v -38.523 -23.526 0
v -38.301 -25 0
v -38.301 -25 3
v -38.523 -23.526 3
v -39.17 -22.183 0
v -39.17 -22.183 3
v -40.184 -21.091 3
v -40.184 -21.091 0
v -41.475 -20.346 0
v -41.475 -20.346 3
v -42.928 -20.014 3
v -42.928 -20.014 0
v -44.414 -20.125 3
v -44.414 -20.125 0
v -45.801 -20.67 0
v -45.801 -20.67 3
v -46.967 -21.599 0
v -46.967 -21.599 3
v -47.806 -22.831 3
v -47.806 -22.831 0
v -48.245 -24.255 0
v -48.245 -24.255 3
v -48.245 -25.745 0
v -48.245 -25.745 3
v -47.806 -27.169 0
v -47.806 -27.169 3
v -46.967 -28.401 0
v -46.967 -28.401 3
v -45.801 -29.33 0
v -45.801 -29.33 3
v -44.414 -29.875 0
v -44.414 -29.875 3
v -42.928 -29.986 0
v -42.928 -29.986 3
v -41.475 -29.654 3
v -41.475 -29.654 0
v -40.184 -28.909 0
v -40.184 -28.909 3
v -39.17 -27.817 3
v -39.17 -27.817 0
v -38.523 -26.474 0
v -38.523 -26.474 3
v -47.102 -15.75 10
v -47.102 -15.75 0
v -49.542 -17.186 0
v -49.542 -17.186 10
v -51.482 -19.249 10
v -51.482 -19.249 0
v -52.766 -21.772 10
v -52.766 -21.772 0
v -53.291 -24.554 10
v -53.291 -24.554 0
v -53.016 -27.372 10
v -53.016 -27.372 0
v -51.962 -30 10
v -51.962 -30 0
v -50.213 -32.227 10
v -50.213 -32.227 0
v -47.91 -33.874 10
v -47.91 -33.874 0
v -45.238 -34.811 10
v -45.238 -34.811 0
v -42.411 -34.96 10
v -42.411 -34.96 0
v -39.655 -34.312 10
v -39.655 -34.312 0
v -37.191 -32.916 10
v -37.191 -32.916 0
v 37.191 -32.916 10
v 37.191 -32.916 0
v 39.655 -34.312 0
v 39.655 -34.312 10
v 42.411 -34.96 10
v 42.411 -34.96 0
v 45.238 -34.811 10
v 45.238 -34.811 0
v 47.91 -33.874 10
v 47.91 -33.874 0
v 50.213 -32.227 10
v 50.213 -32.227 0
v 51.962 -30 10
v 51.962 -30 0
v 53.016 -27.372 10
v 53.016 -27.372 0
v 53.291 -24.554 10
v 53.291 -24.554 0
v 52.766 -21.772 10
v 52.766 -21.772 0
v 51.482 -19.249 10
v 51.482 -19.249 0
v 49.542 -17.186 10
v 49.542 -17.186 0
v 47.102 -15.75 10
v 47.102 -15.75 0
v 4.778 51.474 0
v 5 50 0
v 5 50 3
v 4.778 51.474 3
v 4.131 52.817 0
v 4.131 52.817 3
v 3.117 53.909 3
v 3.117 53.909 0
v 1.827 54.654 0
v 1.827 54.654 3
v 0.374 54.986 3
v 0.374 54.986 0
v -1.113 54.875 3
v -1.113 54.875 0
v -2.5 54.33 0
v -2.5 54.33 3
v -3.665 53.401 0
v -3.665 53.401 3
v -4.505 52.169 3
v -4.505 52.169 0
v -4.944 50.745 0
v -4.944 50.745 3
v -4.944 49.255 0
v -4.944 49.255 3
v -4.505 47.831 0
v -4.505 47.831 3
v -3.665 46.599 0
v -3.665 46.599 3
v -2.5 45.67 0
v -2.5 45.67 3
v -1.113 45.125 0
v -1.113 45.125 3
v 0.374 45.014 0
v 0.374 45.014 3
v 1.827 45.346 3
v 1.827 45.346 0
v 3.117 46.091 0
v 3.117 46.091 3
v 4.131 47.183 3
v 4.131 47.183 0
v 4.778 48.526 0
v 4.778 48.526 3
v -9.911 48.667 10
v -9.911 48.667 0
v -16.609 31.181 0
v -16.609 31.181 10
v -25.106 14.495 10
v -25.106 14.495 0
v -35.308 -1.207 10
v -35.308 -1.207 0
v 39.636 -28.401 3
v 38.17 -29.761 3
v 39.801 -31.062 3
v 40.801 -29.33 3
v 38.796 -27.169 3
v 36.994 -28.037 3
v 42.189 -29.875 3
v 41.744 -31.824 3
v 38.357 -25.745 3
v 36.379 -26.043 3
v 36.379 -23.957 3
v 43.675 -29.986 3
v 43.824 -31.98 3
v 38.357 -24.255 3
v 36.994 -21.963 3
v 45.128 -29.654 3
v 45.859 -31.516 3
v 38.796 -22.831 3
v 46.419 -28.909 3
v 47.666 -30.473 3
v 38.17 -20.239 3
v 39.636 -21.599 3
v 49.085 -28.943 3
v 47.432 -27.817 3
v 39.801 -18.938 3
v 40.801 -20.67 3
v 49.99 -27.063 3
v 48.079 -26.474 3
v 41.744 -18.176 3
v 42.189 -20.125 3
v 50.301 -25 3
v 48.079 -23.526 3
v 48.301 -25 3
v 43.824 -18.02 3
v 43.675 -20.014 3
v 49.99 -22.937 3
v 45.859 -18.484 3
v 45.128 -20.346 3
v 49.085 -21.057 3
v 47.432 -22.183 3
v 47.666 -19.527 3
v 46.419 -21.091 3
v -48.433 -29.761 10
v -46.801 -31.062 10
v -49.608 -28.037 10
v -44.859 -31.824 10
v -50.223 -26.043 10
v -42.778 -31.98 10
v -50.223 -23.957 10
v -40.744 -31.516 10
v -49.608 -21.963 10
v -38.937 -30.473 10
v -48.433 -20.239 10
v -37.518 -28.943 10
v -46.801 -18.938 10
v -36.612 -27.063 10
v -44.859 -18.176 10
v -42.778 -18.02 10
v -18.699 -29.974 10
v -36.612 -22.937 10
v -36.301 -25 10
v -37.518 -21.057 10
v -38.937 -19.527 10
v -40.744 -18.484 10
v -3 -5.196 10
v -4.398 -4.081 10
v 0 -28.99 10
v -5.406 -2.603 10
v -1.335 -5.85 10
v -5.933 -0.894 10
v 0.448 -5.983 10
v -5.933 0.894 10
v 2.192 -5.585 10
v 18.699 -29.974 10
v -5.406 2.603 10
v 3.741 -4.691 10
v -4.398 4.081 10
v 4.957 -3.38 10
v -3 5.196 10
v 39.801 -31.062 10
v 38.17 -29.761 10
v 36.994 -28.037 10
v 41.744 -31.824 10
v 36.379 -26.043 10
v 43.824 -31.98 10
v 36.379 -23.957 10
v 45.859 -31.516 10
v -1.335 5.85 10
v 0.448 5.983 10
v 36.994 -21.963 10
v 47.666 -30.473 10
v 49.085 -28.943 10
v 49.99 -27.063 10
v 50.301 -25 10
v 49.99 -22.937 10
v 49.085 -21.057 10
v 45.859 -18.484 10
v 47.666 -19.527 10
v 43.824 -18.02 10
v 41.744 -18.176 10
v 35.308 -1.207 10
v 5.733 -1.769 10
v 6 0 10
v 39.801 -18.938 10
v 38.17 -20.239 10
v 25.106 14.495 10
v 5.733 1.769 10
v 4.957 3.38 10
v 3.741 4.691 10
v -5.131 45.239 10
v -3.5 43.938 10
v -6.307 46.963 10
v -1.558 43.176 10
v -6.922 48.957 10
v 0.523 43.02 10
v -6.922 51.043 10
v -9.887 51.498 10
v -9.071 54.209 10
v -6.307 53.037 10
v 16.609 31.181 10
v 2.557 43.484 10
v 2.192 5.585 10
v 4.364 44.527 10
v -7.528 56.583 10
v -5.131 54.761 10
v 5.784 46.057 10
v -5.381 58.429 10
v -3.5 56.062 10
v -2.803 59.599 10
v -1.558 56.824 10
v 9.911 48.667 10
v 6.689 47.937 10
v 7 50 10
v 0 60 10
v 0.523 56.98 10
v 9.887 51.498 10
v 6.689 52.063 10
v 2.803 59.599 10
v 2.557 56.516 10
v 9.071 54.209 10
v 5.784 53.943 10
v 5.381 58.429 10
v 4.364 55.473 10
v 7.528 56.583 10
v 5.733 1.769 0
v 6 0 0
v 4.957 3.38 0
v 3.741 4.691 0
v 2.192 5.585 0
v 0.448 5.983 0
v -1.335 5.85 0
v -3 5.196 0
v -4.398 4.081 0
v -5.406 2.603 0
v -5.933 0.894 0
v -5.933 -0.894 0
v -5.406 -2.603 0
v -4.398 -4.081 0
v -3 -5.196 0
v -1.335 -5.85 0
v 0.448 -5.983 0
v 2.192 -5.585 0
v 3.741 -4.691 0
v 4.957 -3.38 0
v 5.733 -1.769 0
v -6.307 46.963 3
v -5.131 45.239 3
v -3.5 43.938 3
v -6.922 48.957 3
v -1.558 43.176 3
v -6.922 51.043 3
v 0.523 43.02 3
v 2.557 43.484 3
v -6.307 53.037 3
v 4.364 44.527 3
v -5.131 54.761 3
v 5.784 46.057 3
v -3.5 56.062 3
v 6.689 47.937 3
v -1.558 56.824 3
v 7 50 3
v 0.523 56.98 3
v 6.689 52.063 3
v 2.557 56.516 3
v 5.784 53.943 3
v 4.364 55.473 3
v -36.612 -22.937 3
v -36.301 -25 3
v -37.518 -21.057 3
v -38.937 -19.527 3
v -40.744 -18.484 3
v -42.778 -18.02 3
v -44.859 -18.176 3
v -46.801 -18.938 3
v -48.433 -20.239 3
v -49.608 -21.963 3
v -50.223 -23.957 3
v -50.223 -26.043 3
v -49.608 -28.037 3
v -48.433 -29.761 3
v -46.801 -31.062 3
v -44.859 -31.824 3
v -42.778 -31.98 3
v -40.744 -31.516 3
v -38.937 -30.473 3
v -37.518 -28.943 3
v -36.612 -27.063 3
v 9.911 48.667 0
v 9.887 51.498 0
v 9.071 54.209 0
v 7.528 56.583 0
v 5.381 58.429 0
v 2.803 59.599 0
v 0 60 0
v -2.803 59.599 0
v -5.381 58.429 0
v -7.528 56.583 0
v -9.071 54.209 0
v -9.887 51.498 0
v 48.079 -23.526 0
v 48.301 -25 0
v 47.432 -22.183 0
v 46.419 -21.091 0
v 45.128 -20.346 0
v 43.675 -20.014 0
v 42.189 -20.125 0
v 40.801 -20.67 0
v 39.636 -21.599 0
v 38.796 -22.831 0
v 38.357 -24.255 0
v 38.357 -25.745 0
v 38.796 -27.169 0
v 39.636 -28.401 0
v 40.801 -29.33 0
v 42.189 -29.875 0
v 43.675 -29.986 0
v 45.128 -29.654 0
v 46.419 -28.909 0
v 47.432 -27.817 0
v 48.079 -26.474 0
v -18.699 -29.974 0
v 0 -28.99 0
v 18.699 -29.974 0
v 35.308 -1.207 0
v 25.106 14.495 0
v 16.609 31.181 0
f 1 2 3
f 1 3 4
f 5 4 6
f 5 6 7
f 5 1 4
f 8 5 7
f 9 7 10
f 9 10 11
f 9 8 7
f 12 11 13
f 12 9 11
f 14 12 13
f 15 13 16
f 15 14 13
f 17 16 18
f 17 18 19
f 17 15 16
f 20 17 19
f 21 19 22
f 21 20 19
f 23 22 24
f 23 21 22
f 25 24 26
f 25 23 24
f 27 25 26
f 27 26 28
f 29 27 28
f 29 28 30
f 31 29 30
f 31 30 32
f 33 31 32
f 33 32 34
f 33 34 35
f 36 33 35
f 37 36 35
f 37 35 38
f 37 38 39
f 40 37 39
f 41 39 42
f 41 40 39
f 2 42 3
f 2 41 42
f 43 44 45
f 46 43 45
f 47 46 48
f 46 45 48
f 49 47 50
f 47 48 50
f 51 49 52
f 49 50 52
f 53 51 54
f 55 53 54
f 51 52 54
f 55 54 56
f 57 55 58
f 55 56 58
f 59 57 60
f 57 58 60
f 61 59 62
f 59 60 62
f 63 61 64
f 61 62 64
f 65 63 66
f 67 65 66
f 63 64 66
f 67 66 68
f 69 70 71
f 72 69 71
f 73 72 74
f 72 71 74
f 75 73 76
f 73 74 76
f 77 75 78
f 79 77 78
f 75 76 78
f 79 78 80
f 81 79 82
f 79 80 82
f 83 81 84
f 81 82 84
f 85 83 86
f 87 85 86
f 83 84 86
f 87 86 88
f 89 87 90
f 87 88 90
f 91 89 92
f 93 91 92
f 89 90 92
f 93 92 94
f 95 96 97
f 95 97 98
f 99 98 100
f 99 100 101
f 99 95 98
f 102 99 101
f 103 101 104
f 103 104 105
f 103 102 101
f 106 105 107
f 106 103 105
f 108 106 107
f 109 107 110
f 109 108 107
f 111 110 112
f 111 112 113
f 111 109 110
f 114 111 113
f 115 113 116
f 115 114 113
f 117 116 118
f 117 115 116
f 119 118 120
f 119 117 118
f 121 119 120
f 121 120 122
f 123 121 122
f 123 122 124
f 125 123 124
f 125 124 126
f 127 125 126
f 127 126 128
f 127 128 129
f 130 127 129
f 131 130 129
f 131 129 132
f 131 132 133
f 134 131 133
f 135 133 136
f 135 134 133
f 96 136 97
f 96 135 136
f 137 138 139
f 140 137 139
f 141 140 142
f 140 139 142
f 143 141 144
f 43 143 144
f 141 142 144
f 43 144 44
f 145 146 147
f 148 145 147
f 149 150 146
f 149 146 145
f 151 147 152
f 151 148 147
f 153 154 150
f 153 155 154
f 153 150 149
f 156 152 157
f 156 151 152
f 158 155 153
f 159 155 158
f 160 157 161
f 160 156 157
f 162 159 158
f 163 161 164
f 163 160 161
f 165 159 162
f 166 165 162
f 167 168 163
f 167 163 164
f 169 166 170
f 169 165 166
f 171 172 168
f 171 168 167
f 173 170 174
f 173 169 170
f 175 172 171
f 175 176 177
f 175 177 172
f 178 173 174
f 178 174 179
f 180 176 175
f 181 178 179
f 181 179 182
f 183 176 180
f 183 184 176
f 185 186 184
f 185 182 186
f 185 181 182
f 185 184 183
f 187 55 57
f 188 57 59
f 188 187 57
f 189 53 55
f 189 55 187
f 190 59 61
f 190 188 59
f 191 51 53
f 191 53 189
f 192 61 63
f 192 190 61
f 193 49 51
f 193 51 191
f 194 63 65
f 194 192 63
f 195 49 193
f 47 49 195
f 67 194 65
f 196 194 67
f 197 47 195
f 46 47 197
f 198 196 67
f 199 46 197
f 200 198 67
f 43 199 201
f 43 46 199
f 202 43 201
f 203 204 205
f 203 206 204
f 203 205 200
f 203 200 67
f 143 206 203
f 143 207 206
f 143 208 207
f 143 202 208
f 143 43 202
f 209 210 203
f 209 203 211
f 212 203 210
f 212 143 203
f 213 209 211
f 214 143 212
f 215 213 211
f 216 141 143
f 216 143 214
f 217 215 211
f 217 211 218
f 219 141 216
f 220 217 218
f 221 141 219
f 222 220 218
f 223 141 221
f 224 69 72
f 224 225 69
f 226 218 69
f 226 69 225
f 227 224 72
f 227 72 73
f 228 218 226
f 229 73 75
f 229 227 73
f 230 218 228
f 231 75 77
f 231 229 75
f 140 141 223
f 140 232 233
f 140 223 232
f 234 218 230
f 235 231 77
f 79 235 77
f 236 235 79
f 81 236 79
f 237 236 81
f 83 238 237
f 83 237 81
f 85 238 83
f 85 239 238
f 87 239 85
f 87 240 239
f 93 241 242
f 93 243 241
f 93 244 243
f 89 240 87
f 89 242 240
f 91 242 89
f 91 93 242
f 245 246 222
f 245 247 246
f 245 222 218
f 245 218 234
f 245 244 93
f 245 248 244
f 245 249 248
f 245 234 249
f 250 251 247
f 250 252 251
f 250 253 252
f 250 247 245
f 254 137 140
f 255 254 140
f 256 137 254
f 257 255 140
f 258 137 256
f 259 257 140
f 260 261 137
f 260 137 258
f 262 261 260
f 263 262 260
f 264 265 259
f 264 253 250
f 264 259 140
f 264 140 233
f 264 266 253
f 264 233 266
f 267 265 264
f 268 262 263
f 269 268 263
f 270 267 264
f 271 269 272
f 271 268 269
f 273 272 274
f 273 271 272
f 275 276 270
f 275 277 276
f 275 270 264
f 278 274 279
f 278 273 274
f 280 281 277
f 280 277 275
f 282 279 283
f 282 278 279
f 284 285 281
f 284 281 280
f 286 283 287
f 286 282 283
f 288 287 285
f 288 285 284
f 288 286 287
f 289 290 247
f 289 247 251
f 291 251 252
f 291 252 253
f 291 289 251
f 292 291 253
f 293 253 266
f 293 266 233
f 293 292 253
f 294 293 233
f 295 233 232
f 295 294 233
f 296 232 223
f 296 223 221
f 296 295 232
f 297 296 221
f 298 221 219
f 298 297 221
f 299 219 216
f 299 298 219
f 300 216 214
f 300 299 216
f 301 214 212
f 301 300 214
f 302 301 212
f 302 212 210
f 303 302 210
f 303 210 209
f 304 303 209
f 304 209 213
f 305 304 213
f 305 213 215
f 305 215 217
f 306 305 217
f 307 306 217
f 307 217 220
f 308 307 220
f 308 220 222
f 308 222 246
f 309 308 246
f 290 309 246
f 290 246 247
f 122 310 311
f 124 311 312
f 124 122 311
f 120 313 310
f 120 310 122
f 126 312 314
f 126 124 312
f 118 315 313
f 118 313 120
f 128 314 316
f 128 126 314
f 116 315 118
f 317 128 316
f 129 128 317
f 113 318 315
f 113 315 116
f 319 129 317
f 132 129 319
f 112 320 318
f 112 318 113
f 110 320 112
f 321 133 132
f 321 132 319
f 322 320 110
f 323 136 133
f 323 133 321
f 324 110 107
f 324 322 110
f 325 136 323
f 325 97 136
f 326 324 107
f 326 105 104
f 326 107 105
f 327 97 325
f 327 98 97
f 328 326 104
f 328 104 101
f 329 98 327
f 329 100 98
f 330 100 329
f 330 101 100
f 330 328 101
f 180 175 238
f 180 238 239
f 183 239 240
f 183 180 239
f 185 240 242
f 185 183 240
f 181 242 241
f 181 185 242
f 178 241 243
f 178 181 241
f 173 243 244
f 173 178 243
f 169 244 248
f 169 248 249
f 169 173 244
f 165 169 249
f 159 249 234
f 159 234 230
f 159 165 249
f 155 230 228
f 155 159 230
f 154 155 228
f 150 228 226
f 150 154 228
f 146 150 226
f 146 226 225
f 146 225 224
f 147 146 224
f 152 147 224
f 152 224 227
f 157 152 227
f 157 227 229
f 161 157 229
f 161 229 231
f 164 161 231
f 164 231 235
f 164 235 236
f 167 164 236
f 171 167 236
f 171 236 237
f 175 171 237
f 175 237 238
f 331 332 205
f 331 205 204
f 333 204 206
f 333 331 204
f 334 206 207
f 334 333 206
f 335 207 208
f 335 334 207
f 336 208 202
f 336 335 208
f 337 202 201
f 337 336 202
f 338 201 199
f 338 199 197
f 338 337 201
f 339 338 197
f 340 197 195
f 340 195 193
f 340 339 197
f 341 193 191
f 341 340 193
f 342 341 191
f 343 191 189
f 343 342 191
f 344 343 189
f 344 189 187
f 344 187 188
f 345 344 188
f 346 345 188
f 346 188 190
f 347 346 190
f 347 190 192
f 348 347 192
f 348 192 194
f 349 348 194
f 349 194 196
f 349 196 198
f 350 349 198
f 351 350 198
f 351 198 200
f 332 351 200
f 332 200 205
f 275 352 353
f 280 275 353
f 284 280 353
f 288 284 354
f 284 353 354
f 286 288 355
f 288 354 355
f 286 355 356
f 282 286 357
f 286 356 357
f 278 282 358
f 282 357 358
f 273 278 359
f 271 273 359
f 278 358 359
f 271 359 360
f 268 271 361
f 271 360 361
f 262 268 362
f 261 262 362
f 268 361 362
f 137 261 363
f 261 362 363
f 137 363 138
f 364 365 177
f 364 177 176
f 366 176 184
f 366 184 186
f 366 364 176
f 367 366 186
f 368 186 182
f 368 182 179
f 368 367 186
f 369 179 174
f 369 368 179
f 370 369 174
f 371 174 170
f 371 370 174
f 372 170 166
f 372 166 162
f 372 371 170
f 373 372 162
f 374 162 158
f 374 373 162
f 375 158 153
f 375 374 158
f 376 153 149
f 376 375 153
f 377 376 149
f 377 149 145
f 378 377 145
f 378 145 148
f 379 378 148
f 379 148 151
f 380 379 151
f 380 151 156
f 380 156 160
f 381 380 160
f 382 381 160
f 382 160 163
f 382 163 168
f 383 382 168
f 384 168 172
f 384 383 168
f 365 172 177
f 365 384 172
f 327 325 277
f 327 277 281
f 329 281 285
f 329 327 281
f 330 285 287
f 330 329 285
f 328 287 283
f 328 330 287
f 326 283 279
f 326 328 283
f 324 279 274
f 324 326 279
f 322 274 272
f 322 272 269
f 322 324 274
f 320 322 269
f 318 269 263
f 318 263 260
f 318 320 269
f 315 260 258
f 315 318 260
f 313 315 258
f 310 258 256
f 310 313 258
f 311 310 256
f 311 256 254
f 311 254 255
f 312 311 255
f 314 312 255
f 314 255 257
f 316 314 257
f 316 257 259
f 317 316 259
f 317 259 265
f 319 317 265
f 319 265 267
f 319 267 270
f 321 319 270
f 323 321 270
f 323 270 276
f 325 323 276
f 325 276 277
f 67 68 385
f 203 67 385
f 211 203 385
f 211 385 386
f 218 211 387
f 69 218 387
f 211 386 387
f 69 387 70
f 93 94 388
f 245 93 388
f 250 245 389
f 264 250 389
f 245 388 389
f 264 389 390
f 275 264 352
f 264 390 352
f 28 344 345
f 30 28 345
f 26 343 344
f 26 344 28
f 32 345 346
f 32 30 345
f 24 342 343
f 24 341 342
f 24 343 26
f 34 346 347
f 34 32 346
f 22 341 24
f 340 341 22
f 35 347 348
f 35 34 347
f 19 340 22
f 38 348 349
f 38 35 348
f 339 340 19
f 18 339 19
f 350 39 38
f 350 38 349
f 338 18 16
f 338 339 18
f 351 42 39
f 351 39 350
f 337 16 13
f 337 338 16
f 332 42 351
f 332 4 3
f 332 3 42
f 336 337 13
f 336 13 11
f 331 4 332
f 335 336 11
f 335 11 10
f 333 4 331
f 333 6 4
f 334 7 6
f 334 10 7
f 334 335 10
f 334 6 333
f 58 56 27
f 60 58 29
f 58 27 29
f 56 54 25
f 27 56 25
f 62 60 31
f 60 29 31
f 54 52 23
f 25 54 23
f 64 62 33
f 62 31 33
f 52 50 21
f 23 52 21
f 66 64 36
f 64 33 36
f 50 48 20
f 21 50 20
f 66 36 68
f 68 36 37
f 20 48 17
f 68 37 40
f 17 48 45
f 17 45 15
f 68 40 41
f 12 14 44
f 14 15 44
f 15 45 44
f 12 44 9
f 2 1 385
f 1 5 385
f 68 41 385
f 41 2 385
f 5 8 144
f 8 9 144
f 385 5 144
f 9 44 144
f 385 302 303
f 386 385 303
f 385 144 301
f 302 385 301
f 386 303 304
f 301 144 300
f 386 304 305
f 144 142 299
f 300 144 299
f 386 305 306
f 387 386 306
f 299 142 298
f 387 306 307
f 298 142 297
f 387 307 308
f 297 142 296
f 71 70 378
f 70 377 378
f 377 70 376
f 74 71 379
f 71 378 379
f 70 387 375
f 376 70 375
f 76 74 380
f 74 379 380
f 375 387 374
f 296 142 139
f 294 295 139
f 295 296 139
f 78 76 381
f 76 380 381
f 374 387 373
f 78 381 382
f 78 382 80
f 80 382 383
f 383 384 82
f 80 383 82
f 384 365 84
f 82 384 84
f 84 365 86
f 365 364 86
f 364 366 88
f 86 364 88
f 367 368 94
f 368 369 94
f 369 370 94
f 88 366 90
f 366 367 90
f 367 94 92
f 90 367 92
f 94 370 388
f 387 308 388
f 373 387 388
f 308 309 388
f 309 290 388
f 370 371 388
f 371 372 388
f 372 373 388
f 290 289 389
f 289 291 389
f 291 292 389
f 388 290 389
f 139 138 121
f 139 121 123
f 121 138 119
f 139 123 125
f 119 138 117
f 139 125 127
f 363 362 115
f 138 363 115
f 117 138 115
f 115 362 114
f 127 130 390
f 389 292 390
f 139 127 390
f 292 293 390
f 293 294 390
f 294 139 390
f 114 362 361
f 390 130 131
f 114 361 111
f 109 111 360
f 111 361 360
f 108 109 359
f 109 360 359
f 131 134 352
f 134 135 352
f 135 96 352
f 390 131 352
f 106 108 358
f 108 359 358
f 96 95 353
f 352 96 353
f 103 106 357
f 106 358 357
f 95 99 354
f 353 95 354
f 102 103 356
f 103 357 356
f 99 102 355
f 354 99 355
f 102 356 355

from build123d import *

# Parameters (mm, degrees)
F1_R     = 7
F1_R_2   = 6
F1_R_3   = 5
F2_DEPTH = 3
F3_DEPTH = 10


# Not quite as in the source:
# - a feature of the source that left no trace in its solid (it failed there, or was rolled back) is left out


with BuildPart() as f2:
    # F1 (on Top) → F2 (new body)
    with BuildSketch(Plane.XY):
        with BuildLine():
            ThreePointArc((9.9107145783, 48.6666821283), (0, 60), (-9.9107145783, 48.6666821283))
            ThreePointArc((-9.9107145783, 48.6666821283), (-25.1057988762, 14.4948397394), (-47.1019403302, -15.7504104697))
            ThreePointArc((-47.1019403302, -15.7504104697), (-51.9615242271, -30), (-37.1912257519, -32.9162716586))
            ThreePointArc((-37.1912257519, -32.9162716586), (0, -28.9896794788), (37.1912257519, -32.9162716586))
            ThreePointArc((37.1912257519, -32.9162716586), (51.9615242271, -30), (47.1019403302, -15.7504104697))
            ThreePointArc((47.1019403302, -15.7504104697), (25.1057988762, 14.4948397394), (9.9107145783, 48.6666821283))
        make_face()
        with Locations((-43.3012701892, -25)):
            Circle(F1_R, mode=Mode.SUBTRACT)
        with Locations((43.3012701892, -25)):
            Circle(F1_R, mode=Mode.SUBTRACT)
        Circle(F1_R_2, mode=Mode.SUBTRACT)
        with Locations((0, 50)):
            Circle(F1_R, mode=Mode.SUBTRACT)
        with Locations((-43.3012701892, -25)):
            Circle(F1_R)
        with Locations((-43.3012701892, -25)):
            Circle(F1_R_3, mode=Mode.SUBTRACT)
        with Locations((43.3012701892, -25)):
            Circle(F1_R)
        with Locations((43.3012701892, -25)):
            Circle(F1_R_3, mode=Mode.SUBTRACT)
        with Locations((0, 50)):
            Circle(F1_R)
        with Locations((0, 50)):
            Circle(F1_R_3, mode=Mode.SUBTRACT)
    extrude(amount=F2_DEPTH)

    # F1 (on Top) → F3 (join)
    with BuildSketch(Plane.XY):
        with BuildLine():
            ThreePointArc((9.9107145783, 48.6666821283), (0, 60), (-9.9107145783, 48.6666821283))
            ThreePointArc((-9.9107145783, 48.6666821283), (-25.1057988762, 14.4948397394), (-47.1019403302, -15.7504104697))
            ThreePointArc((-47.1019403302, -15.7504104697), (-51.9615242271, -30), (-37.1912257519, -32.9162716586))
            ThreePointArc((-37.1912257519, -32.9162716586), (0, -28.9896794788), (37.1912257519, -32.9162716586))
            ThreePointArc((37.1912257519, -32.9162716586), (51.9615242271, -30), (47.1019403302, -15.7504104697))
            ThreePointArc((47.1019403302, -15.7504104697), (25.1057988762, 14.4948397394), (9.9107145783, 48.6666821283))
        make_face()
        with Locations((-43.3012701892, -25)):
            Circle(F1_R, mode=Mode.SUBTRACT)
        with Locations((43.3012701892, -25)):
            Circle(F1_R, mode=Mode.SUBTRACT)
        Circle(F1_R_2, mode=Mode.SUBTRACT)
        with Locations((0, 50)):
            Circle(F1_R, mode=Mode.SUBTRACT)
    extrude(amount=F3_DEPTH)


solid = f2.part
